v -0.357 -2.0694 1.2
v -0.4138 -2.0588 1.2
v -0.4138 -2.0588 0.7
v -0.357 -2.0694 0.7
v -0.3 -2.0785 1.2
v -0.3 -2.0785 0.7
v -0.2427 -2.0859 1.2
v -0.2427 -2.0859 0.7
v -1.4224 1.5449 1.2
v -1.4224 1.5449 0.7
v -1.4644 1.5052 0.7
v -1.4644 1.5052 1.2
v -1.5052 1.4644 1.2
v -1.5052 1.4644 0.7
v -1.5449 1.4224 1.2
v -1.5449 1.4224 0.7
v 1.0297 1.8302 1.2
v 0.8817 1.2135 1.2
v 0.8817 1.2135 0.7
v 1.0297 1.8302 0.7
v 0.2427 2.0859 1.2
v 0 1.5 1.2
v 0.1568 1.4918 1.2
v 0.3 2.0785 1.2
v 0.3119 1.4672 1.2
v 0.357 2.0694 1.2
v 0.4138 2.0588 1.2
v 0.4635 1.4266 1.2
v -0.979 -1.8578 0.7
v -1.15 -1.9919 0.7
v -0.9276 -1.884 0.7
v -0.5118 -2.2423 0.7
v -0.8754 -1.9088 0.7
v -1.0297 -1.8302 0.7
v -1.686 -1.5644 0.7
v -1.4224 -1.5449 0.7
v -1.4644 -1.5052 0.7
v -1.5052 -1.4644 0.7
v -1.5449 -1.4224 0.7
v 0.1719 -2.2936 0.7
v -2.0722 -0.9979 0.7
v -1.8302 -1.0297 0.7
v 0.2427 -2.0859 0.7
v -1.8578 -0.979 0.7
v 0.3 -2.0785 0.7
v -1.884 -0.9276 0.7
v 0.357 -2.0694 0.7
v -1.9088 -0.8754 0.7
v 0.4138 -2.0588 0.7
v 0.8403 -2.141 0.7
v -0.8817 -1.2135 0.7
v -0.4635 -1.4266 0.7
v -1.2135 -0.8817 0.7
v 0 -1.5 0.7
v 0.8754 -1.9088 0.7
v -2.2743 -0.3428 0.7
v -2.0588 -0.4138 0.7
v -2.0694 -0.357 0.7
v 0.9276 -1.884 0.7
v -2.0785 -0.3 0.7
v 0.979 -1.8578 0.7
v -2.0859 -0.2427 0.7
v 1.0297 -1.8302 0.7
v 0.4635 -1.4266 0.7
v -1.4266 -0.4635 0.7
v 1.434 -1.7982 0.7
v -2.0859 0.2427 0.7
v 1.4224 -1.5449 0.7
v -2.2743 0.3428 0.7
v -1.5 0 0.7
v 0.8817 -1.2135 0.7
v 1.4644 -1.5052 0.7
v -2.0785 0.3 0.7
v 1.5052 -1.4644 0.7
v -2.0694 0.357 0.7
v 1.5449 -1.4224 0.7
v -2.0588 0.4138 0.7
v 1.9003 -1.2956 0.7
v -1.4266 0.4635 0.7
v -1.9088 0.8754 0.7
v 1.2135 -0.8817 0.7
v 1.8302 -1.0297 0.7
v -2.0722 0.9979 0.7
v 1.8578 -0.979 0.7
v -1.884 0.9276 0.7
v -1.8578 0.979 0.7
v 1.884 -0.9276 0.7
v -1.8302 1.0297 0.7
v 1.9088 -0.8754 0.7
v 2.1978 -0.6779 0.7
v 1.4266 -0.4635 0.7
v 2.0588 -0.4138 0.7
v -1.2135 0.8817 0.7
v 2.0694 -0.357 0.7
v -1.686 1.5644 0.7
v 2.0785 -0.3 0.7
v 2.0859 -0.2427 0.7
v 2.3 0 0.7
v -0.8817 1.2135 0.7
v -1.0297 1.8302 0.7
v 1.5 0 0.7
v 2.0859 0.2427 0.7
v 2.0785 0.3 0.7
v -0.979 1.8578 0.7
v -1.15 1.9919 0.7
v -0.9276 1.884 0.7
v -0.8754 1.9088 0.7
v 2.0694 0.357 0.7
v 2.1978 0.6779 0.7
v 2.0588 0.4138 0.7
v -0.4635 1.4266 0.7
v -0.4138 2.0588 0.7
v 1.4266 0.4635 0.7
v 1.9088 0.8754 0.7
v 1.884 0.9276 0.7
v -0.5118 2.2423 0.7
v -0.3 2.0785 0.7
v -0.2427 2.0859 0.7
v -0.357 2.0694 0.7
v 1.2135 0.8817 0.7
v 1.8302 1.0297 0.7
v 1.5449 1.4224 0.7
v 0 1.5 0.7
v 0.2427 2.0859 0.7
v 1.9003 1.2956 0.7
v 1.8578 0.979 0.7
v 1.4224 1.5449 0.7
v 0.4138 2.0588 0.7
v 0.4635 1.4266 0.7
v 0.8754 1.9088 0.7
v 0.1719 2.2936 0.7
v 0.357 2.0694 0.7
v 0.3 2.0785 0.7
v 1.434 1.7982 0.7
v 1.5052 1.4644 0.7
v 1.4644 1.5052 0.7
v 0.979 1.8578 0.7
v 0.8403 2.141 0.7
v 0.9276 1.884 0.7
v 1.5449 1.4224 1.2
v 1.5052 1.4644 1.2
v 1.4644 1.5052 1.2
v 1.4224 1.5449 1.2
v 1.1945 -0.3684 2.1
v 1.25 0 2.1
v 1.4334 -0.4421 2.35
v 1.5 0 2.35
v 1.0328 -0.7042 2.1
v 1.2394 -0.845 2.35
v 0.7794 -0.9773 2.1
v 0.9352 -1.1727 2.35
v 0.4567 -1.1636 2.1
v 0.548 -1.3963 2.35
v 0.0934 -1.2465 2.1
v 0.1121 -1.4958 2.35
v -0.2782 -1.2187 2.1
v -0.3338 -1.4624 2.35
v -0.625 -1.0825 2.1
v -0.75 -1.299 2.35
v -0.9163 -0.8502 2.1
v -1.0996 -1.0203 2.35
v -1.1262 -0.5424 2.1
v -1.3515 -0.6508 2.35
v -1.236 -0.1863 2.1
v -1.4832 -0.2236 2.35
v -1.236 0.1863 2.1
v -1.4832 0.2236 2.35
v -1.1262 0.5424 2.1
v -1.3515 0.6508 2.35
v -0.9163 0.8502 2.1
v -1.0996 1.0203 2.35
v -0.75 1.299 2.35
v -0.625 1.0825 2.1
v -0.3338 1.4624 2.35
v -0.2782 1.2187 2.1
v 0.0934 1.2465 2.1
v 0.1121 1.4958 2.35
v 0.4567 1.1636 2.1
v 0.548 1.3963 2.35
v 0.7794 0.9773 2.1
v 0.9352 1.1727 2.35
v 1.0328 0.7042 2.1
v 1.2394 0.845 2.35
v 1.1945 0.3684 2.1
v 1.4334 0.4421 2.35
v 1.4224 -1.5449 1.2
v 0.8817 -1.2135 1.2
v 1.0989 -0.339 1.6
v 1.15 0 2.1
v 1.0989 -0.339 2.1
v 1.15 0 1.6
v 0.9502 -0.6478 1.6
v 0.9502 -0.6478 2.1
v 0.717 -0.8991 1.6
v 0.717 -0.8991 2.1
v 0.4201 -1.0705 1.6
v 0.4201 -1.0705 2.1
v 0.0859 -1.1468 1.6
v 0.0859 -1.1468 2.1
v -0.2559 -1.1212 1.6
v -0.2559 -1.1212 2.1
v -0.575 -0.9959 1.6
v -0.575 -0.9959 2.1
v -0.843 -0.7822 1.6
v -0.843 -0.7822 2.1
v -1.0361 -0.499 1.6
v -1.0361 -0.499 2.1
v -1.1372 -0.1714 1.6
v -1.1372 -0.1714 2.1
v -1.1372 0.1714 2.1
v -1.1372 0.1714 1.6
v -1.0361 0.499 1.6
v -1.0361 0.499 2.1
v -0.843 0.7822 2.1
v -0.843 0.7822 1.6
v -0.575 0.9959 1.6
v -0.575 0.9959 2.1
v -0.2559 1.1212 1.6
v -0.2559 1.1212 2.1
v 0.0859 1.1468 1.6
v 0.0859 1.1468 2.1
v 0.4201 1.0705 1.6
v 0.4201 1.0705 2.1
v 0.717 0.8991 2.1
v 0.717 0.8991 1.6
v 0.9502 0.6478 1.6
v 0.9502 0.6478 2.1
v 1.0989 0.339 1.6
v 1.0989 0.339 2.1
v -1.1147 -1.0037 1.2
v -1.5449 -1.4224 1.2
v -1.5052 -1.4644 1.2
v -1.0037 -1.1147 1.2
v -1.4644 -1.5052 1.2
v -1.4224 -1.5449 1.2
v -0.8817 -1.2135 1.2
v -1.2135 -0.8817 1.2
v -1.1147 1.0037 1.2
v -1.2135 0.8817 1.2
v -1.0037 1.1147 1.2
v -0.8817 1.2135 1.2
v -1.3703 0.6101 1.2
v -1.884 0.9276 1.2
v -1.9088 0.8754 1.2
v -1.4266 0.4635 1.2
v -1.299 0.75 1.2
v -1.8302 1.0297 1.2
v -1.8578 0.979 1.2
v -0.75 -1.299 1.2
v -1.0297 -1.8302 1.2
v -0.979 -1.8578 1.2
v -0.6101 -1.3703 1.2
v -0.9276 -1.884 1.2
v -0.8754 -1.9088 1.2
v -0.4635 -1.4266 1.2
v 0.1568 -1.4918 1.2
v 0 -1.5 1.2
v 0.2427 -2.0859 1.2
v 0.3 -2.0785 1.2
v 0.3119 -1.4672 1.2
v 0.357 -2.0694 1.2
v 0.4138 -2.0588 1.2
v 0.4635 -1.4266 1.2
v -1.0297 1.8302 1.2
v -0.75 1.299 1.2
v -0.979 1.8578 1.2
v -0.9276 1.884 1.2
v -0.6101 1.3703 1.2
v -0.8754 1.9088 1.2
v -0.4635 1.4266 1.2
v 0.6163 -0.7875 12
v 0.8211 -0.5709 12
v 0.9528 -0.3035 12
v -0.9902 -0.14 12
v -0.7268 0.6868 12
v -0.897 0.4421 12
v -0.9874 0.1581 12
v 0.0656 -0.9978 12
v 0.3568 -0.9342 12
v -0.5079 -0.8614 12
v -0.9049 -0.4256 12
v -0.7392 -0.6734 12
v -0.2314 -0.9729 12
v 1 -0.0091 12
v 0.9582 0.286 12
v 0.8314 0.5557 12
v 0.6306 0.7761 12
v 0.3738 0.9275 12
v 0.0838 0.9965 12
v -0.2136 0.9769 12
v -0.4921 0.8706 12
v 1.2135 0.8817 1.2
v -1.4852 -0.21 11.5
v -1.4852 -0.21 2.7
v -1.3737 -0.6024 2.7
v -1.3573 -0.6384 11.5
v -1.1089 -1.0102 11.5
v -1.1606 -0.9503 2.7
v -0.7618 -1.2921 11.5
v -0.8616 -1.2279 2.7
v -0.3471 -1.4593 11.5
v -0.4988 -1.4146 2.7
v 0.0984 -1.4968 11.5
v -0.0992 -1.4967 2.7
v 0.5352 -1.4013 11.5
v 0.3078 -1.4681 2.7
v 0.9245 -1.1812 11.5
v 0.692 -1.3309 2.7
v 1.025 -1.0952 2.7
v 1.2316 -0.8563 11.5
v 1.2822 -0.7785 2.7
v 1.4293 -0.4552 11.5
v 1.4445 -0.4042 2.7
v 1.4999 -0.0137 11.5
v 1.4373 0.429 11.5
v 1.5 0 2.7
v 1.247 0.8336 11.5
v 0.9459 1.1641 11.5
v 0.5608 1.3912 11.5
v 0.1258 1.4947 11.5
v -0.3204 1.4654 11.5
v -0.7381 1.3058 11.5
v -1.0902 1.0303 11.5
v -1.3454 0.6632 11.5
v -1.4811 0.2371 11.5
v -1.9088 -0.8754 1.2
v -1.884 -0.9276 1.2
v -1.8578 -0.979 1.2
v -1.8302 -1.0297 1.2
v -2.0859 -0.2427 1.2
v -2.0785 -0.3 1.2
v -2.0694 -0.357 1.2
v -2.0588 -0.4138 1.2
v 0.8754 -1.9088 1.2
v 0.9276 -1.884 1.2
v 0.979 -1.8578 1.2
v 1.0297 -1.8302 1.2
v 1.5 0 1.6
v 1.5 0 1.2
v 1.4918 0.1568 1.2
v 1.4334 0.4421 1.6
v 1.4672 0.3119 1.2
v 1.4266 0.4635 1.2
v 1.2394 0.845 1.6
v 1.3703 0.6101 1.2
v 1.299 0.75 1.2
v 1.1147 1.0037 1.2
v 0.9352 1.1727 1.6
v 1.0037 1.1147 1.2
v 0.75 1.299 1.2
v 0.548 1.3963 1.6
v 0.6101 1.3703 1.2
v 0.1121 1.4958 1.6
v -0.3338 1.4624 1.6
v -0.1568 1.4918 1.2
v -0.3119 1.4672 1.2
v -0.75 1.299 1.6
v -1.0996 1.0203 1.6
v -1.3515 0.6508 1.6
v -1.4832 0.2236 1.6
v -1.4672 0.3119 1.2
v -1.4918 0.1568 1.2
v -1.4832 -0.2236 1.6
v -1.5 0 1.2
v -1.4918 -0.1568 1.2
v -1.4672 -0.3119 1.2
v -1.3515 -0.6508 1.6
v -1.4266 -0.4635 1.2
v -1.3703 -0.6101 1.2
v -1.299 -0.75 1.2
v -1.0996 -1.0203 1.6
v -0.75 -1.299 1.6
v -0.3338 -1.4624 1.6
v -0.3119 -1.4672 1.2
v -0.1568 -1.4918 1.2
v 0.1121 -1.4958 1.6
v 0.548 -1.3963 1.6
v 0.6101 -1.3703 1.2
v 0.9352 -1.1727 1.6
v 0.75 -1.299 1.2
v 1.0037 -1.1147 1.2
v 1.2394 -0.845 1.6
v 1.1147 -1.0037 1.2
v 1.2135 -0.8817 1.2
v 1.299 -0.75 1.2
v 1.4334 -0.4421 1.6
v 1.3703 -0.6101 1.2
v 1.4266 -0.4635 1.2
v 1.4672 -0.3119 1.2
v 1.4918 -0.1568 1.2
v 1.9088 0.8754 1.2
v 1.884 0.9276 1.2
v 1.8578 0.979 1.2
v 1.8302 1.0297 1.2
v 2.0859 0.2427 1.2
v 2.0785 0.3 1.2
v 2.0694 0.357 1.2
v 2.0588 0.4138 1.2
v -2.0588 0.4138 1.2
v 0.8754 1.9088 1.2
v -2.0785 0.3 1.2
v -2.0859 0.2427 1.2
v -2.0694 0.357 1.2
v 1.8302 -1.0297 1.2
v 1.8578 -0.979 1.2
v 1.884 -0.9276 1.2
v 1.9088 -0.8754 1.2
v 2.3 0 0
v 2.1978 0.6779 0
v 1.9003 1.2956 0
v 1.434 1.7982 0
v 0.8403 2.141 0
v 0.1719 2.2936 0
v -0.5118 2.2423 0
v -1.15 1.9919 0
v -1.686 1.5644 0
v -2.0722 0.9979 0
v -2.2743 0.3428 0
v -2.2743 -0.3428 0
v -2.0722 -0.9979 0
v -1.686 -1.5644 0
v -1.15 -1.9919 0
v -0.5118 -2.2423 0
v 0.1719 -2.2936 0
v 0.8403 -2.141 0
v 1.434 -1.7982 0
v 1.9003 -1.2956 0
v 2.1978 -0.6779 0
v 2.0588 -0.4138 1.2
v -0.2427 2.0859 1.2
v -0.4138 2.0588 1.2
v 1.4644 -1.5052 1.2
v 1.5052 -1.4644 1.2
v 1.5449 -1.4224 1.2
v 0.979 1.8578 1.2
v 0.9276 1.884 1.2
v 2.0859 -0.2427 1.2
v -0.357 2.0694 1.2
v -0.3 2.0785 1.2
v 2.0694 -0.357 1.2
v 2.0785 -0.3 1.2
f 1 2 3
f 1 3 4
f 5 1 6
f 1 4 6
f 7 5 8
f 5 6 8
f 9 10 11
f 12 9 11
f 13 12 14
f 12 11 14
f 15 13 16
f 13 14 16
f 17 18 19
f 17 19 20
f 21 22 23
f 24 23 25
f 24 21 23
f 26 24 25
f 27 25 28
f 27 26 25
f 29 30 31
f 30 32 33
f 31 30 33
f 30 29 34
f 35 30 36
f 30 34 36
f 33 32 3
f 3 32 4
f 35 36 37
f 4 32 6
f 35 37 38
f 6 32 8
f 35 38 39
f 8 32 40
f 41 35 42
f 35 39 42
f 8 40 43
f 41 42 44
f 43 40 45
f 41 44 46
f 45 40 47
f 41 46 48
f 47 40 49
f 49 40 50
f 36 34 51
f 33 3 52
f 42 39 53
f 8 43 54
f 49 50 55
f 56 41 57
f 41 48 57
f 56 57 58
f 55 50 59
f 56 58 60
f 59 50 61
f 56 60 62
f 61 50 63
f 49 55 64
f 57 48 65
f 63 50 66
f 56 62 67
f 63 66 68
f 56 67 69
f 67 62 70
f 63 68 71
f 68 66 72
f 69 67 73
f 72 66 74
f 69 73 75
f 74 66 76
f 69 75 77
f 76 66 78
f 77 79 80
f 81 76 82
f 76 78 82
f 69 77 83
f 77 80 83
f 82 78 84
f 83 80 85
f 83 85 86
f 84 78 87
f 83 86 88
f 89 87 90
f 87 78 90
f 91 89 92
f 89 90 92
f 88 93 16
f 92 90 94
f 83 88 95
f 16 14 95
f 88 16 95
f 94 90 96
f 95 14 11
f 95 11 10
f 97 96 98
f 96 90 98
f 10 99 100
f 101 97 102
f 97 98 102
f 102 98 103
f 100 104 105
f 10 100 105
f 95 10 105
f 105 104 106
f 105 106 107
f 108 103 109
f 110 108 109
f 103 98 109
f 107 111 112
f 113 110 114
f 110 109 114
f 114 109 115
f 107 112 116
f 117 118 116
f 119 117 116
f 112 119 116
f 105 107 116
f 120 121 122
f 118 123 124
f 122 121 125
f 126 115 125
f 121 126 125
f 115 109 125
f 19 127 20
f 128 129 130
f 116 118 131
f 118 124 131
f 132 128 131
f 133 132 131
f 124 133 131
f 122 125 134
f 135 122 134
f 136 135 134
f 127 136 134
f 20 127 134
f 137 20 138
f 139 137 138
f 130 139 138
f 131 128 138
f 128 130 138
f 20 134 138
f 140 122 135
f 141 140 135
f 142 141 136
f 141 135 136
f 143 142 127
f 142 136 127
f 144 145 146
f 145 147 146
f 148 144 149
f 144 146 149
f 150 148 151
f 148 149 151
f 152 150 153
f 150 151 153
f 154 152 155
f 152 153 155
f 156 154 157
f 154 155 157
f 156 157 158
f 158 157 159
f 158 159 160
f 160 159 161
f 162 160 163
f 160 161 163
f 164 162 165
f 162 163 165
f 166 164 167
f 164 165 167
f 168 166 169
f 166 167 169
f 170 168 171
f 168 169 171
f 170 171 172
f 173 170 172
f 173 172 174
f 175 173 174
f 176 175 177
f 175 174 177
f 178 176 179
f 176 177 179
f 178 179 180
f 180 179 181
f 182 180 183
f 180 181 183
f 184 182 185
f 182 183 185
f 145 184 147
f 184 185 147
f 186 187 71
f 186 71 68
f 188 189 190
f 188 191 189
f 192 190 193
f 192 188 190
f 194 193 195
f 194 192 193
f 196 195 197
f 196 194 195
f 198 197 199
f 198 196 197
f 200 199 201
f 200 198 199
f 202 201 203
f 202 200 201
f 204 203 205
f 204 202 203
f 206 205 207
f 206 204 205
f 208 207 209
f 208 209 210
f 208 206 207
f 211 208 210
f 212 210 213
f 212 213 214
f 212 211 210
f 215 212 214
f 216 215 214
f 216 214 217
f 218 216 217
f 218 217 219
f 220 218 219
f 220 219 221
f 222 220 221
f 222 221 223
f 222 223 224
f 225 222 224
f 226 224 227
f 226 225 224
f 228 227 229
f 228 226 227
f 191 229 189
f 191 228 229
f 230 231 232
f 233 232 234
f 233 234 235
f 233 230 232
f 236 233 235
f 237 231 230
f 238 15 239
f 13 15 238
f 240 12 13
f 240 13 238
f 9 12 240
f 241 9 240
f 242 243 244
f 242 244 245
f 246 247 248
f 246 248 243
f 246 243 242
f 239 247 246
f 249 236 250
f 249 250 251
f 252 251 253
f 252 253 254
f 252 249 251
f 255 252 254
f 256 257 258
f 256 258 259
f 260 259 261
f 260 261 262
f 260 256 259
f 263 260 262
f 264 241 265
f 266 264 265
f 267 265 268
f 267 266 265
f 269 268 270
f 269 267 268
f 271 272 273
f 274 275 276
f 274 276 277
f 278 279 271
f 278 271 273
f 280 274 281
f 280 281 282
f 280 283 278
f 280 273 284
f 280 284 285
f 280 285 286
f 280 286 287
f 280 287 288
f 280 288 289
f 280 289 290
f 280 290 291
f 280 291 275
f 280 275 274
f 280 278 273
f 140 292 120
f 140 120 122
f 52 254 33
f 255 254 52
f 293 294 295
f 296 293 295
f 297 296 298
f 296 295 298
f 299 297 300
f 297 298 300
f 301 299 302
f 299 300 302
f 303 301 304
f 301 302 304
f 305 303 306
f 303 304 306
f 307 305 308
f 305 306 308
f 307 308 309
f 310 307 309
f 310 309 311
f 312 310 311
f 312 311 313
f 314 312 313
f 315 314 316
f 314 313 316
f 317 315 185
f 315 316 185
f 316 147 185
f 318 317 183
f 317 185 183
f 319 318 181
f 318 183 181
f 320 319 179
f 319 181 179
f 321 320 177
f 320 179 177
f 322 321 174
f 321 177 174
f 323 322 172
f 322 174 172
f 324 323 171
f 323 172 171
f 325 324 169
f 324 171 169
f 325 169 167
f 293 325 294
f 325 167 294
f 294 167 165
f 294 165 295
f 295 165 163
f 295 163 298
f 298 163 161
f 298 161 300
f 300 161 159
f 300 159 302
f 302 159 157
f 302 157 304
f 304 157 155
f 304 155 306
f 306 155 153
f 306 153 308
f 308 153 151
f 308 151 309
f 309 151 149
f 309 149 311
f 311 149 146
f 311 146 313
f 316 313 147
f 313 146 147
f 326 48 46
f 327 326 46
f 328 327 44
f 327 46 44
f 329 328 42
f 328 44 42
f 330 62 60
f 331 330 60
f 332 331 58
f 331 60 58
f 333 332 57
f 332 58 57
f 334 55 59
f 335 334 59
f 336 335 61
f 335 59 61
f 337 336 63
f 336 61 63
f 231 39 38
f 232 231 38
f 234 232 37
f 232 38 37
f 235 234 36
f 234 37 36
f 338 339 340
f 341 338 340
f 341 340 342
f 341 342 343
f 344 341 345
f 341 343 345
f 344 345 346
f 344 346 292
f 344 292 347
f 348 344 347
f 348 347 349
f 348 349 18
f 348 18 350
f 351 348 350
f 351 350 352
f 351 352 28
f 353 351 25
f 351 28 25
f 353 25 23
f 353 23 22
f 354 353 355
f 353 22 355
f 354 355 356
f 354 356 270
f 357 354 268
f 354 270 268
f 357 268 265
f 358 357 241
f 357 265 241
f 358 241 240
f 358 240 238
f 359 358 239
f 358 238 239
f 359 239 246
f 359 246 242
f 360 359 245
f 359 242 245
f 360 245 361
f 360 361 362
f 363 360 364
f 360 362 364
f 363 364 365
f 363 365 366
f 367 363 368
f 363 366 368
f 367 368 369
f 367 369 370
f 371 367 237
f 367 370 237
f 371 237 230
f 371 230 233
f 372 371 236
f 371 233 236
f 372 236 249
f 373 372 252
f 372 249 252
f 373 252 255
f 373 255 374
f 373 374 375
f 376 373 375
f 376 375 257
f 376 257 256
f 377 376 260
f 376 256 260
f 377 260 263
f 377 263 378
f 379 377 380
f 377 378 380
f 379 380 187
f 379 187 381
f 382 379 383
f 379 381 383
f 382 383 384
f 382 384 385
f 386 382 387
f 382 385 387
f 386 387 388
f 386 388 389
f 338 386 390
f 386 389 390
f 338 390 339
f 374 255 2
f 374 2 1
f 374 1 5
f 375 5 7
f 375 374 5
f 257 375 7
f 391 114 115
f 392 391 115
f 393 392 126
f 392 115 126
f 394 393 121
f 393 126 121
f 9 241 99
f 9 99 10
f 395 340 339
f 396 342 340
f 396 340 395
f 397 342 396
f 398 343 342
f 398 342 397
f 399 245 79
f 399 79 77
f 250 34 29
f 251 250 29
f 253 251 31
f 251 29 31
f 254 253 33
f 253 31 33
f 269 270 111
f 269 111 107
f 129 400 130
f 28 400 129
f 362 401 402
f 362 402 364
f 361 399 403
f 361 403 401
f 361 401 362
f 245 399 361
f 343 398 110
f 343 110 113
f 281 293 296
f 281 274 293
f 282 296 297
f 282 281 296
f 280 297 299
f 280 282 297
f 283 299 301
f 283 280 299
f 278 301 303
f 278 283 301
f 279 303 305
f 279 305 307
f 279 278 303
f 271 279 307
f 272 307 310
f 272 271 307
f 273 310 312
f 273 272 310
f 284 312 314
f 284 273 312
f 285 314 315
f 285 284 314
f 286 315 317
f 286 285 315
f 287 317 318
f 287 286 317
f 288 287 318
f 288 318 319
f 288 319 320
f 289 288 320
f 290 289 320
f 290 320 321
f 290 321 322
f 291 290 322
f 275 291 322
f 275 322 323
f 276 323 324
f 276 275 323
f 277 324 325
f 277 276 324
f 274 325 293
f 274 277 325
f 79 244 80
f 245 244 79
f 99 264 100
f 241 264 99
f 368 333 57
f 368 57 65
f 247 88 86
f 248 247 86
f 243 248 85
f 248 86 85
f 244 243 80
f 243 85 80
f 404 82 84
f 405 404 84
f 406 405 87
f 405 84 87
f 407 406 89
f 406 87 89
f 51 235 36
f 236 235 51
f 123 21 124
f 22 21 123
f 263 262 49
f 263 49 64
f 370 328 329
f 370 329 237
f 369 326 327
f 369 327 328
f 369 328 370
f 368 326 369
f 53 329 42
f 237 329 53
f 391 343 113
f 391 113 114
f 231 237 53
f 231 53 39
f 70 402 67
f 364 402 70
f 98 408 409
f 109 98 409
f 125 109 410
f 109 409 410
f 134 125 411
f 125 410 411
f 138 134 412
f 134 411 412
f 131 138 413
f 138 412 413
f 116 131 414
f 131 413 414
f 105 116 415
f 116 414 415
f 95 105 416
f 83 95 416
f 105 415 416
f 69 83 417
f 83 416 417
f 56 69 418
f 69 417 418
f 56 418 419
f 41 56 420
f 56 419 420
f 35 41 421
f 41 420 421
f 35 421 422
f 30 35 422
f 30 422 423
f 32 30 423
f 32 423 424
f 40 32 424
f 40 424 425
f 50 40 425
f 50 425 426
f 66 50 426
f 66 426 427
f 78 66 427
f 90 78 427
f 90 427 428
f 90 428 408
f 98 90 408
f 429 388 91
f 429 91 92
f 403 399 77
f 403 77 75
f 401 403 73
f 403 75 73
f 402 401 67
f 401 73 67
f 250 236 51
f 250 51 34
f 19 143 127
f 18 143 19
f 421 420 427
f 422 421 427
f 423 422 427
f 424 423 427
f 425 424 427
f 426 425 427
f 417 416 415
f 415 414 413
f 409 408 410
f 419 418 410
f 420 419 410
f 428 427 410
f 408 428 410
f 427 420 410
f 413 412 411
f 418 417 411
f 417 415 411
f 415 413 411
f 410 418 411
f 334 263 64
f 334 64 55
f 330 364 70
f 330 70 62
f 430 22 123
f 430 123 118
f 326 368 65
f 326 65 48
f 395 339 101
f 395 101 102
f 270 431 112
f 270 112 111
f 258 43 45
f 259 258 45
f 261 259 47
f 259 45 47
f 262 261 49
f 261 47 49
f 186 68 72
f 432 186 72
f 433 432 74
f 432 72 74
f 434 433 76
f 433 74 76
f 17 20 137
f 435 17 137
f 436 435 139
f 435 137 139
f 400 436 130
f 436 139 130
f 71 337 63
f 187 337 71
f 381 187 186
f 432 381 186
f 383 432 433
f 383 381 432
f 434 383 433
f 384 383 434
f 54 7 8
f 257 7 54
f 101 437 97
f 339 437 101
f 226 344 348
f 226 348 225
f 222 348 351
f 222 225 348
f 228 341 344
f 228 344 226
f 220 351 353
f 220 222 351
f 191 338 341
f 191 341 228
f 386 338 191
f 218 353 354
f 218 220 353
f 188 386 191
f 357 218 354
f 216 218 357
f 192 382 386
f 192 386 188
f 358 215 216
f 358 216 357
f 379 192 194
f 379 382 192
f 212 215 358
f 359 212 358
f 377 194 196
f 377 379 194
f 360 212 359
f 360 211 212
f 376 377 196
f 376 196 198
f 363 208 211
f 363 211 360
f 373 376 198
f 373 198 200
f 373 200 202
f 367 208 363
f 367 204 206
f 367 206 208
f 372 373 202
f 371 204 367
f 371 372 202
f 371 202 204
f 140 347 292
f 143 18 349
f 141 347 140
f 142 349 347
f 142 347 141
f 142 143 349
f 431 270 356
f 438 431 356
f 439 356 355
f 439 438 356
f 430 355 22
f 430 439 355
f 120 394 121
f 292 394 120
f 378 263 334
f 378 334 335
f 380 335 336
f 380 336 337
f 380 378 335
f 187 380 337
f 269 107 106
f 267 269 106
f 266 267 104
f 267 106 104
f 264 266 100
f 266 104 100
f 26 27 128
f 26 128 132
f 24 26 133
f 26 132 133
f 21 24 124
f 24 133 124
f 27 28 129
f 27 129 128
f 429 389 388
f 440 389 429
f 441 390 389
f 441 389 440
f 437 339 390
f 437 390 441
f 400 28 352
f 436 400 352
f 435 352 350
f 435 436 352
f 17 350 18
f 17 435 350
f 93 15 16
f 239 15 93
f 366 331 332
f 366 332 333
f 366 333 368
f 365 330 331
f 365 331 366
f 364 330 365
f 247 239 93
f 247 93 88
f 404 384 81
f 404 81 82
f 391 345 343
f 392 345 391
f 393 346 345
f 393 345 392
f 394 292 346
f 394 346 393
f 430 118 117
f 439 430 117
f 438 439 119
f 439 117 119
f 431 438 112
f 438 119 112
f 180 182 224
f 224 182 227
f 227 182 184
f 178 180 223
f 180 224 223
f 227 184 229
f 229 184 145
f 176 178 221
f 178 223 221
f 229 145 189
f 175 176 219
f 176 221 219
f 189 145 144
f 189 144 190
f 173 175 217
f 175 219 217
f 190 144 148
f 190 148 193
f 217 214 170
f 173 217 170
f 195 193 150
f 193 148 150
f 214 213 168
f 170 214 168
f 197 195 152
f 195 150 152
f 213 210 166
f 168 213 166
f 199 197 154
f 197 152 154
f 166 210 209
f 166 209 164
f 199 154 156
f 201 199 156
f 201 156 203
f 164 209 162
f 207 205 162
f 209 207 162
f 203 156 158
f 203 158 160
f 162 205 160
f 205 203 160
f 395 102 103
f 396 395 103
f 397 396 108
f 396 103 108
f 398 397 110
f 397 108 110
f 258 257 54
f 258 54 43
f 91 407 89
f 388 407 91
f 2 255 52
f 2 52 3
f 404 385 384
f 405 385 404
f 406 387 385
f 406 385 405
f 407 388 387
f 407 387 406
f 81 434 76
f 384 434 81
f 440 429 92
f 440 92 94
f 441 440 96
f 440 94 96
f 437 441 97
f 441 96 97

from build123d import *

# Parameters (mm, degrees)
SKETCH_1_R               = 2.3
EXTRUDE_1_DEPTH          = 1.2
SKETCH_2_R               = 1.5
EXTRUDE_2_DEPTH          = 1.5
CUT_EXTRUDE_1_DEPTH      = 0.5
PATTERN_CIRCULAR_1_COUNT = 20
SKETCH_4_W               = 0.35
SKETCH_4_H               = 0.5
SKETCH_6_W               = 9.3
SKETCH_6_H               = 1.5
CHAMFER_2_SIZE           = 0.5
CUT_EXTRUDE_START        = -0.5
SKETCH_7_R               = 2.3
SKETCH_7_R_2             = 2.1
CUT_EXTRUDE_2_DEPTH      = 0.5


with BuildPart() as part:
    # Эскиз1 → Вытянуть1 (new body)
    with BuildSketch(Plane.XY):
        Circle(SKETCH_1_R)
    extrude(amount=EXTRUDE_1_DEPTH)

    # Эскиз2 → Вытянуть2 (add)
    with BuildSketch(Plane.XY.offset(1.2)):
        Circle(SKETCH_2_R)
    extrude(amount=EXTRUDE_2_DEPTH)

    # Эскиз3 → Вырез-Вытянуть1 (cut)
    with BuildSketch(Plane.XY.offset(1.2)):
        Polygon((-0.33137085, 2.3), (0.33137085, 2.3), (0, 1.5), align=None)
    cut_extrude_1 = extrude(amount=-CUT_EXTRUDE_1_DEPTH, mode=Mode.SUBTRACT)

    # Круговой массив1: Вырез-Вытянуть1 ×20 about axis
    pattern_circular_1_axis = Axis((0, 0, 0), (0, 0, 1))
    for i in range(1, PATTERN_CIRCULAR_1_COUNT):
        add(cut_extrude_1.rotate(pattern_circular_1_axis, i * 360 / PATTERN_CIRCULAR_1_COUNT), mode=Mode.SUBTRACT)

    # Эскиз4 → Вырез-Повернуть1 (revolve, cut)
    with BuildSketch(Plane(origin=(0, 0, 0), x_dir=(1, 0, 0), z_dir=(0, 1, 0))):
        with Locations((1.325, -1.85)):
            Rectangle(SKETCH_4_W, SKETCH_4_H)
    revolve(axis=Axis((0, 0, 10.642619983), (0, 0, -1)), mode=Mode.SUBTRACT)

    # Эскиз6 → Повернуть1 (revolve)
    with BuildSketch(Plane(origin=(0, 0, 0), x_dir=(0, 0, -1), z_dir=(1, 0, 0)), mode=Mode.PRIVATE) as revolve_1_sk:
        with Locations((-7.35, -0.75)):
            Rectangle(SKETCH_6_W, SKETCH_6_H)
    revolve(revolve_1_sk.sketch.rotate(Axis((0, 0, 2.7), (0, 0, 1)), 278.047567557), axis=Axis((0, 0, 2.7), (0, 0, 1)))

    # Фаска2
    # the kernel refuses this chamfer: 0.5 mm, written as the material it takes off along each edge
    with BuildSketch(Plane(origin=(0, 0, 12), x_dir=(-0.9901521845161062, -0.1399951838385265, 0), z_dir=(-0.1399951838385265, 0.9901521845161062, 0))) as chamfer_2_piece_1:
        Polygon((1.5, -CHAMFER_2_SIZE), (1.5 - CHAMFER_2_SIZE, 0), (1.5, 0), align=None)
    revolve(axis=Axis((0, 0, 12), (0, 0, 1)), mode=Mode.SUBTRACT)

    # Эскиз7 → Вырез-Вытянуть2 (cut)
    with BuildSketch(Plane.XY.offset(1.2).offset(CUT_EXTRUDE_START)):
        with Locations(Location((0, 0, 0), (0, 0, 180))):
            Circle(SKETCH_7_R)
        Circle(SKETCH_7_R_2, mode=Mode.SUBTRACT)
    extrude(amount=CUT_EXTRUDE_2_DEPTH, mode=Mode.SUBTRACT)

    # Фаска3
    # the kernel refuses this chamfer: 0.25 mm, written as the material it takes off along each edge
    with BuildSketch(Plane(origin=(0, 0, 2.1), x_dir=(1, 0, 0), z_dir=(0, 1, 0))) as chamfer_3_piece_1:
        with BuildLine():
            Line((1.242928932, 0.007071068), (1.507071068, -0.257071068))
            Line((1.507071068, -0.257071068), (1.512071068, -0.257071068))
            ThreePointArc((1.512071068, -0.257071068), (1.505, -0.128535534), (1.505, 0))
            Line((1.505, 0), (1.5, 0.005))
            ThreePointArc((1.5, 0.005), (1.371464466, 0.005), (1.242928932, 0.012071068))
            Line((1.242928932, 0.012071068), (1.242928932, 0.007071068))
        make_face()
    revolve(axis=Axis((0, 0, 2.1), (0, 0, -1)), mode=Mode.SUBTRACT)


solid = part.part
